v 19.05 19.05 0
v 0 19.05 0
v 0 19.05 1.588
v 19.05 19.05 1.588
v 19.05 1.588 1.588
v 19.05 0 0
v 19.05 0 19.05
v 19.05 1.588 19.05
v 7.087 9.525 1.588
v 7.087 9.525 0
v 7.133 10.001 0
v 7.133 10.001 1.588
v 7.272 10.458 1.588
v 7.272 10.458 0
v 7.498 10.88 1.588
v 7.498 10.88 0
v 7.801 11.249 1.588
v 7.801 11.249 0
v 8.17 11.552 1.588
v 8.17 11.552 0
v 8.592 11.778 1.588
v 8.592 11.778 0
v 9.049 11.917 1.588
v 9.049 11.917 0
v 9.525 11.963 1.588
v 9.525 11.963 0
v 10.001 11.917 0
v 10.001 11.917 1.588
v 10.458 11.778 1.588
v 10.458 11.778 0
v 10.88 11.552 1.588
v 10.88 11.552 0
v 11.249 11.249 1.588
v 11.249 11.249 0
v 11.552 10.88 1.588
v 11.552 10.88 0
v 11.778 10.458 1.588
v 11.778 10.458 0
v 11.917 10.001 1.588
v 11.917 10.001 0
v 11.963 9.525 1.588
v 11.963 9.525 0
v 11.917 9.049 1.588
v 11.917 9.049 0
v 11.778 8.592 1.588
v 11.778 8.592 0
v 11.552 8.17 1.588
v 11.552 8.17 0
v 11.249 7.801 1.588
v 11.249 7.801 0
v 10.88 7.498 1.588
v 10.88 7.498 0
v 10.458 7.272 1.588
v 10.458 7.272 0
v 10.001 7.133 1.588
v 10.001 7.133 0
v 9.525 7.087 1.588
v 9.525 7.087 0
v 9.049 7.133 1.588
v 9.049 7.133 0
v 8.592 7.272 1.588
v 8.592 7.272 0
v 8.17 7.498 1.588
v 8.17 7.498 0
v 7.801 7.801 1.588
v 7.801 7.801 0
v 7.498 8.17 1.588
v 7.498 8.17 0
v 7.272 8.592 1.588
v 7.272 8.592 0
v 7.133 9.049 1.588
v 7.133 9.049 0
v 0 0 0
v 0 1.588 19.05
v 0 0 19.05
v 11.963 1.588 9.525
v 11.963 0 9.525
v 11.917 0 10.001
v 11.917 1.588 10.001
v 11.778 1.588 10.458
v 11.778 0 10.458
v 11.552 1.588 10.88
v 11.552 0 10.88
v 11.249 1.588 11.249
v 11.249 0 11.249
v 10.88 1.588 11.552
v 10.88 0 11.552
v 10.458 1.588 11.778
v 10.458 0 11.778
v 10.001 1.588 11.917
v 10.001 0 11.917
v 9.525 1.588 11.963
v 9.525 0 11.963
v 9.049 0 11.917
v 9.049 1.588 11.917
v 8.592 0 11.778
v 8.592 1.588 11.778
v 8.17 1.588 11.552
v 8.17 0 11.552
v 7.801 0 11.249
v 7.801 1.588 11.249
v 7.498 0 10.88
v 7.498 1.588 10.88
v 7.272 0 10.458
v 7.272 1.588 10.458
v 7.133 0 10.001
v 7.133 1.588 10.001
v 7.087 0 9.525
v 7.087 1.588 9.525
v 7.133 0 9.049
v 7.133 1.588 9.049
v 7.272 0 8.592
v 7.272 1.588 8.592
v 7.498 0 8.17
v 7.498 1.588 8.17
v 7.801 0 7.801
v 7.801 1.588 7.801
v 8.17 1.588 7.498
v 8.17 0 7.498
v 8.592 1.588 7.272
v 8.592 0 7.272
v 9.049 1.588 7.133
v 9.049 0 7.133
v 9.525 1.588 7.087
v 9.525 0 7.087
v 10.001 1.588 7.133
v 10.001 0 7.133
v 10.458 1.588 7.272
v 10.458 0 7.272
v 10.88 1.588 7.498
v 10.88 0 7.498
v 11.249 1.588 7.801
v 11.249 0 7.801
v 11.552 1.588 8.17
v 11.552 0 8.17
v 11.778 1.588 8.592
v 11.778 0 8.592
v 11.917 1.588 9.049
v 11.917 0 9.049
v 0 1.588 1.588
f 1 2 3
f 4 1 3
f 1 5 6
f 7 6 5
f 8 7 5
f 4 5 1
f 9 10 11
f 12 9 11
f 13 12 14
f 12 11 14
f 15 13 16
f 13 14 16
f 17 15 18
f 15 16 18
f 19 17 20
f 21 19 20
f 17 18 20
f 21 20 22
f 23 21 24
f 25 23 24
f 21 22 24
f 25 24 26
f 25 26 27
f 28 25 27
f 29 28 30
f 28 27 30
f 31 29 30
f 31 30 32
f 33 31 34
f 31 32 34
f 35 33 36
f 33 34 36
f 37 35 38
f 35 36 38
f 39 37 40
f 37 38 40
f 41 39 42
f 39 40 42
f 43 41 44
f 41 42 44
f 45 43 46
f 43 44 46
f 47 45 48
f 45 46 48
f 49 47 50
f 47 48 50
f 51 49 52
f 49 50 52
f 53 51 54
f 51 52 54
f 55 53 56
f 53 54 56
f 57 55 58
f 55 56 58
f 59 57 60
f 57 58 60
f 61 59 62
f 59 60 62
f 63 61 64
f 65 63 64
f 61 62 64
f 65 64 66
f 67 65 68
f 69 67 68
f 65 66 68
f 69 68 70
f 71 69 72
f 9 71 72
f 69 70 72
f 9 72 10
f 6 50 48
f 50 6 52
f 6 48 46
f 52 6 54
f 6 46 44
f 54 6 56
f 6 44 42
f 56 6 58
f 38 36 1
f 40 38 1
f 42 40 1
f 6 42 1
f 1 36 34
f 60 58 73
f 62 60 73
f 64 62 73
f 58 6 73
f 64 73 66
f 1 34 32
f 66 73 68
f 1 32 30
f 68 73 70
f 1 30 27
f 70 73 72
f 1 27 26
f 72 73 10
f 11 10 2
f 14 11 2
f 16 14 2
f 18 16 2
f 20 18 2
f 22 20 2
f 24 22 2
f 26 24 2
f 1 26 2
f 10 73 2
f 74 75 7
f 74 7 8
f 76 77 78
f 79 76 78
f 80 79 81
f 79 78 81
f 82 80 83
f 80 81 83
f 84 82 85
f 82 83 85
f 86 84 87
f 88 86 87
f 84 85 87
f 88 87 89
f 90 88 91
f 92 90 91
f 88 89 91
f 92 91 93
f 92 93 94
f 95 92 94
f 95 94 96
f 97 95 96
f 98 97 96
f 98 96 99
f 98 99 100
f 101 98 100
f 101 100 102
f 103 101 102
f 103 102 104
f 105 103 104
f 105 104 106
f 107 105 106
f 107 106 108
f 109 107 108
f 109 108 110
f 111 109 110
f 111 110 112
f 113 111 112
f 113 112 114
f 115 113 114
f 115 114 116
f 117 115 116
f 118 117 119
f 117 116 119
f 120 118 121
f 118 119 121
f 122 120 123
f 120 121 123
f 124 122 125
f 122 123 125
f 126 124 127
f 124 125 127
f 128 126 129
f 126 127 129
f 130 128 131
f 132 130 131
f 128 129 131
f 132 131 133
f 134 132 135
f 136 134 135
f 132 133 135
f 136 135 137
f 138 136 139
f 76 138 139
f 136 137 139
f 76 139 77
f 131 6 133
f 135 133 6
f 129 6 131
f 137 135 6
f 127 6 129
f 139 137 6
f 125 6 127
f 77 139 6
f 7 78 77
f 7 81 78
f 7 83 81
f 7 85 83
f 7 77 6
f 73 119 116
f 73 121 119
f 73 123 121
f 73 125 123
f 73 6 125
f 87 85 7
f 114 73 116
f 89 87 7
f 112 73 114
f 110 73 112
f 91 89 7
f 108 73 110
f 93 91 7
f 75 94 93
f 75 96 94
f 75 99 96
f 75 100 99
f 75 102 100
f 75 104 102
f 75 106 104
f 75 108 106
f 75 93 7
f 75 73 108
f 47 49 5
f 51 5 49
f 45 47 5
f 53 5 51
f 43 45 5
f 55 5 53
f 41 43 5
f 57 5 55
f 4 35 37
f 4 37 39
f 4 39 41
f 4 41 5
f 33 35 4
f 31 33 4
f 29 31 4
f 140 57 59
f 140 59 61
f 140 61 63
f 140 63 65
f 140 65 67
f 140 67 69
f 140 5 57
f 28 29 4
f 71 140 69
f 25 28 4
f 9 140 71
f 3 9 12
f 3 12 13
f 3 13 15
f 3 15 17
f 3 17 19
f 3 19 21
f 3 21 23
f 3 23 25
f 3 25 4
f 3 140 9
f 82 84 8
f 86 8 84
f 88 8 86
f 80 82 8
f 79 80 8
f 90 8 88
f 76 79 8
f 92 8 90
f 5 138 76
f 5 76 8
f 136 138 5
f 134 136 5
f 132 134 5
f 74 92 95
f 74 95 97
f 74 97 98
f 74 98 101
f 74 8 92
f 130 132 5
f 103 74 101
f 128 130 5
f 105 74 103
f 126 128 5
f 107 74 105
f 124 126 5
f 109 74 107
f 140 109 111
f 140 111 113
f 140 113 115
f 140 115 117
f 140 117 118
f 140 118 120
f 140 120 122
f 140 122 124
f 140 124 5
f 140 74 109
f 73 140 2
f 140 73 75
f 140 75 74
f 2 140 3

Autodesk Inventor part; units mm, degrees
ref_plane "YZ Plane" through (0, 0, 0) normal (1, 0, 0) x (0, 1, 0)
ref_plane "XZ Plane" through (0, 0, 0) normal (0, 1, 0) x (-1, 0, 0)
ref_plane "XY Plane" through (0, 0, 0) normal (0, 0, 1) x (1, 0, 0)
sketch "Sketch1" plane through (0, 0, 0) normal (1, 0, 0) x (0, 1, 0)
  line L0 (0, 0) -> (0, 19.05)
  line L1 (0, 0) -> (19.05, 0)
  line L2 (1.5875, 19.05) -> (1.5875, 1.5875)
  line L3 (1.5875, 1.5875) -> (19.05, 1.5875)
  line L4 (0, 19.05) -> (1.5875, 19.05)
  line L5 (19.05, 0) -> (19.05, 1.5875)
  dimension "d0" = 19.05
  dimension "d1" = 19.05
  dimension "d2" = 1.5875
extrude "Extrusion1" add sketch "Sketch1" along normal blind 19.05
sketch "Sketch2" plane through (0, 0, 0) normal (0, -1, 0) x (1, 0, 0)
  line L0 (19.05, 1.5875) -> (19.05, 19.05) construction
  line L1 (19.05, 19.05) -> (0, 0) construction
  line L2 (0, 1.5875) -> (0, 19.05) construction
  line L3 (19.05, 0) -> (19.05, 1.5875) construction
  line L4 (0, 19.05) -> (19.05, 0) construction
  circle A0 centre (9.525, 9.525) radius 2.4384
  dimension "d5" = 4.8768
extrude "Extrusion2" cut sketch "Sketch2" against normal blind 25.4
sketch "Sketch3" plane through (0, 0, 0) normal (0, 0, -1) x (-1, 0, 0)
  line L0 (-19.05, 0) -> (-19.05, 19.05) construction
  line L1 (-19.05, 19.05) -> (0, 0) construction
  line L2 (0, 0) -> (0, 19.05) construction
  line L3 (0, 0) -> (-19.05, 0) construction
  line L4 (0, 19.05) -> (-19.05, 0) construction
  circle A0 centre (-9.525, 9.525) radius 2.4384
  dimension "d8" = 4.8768
extrude "Extrusion3" cut sketch "Sketch3" against normal blind 25.4
properties part number "l-bracket"
